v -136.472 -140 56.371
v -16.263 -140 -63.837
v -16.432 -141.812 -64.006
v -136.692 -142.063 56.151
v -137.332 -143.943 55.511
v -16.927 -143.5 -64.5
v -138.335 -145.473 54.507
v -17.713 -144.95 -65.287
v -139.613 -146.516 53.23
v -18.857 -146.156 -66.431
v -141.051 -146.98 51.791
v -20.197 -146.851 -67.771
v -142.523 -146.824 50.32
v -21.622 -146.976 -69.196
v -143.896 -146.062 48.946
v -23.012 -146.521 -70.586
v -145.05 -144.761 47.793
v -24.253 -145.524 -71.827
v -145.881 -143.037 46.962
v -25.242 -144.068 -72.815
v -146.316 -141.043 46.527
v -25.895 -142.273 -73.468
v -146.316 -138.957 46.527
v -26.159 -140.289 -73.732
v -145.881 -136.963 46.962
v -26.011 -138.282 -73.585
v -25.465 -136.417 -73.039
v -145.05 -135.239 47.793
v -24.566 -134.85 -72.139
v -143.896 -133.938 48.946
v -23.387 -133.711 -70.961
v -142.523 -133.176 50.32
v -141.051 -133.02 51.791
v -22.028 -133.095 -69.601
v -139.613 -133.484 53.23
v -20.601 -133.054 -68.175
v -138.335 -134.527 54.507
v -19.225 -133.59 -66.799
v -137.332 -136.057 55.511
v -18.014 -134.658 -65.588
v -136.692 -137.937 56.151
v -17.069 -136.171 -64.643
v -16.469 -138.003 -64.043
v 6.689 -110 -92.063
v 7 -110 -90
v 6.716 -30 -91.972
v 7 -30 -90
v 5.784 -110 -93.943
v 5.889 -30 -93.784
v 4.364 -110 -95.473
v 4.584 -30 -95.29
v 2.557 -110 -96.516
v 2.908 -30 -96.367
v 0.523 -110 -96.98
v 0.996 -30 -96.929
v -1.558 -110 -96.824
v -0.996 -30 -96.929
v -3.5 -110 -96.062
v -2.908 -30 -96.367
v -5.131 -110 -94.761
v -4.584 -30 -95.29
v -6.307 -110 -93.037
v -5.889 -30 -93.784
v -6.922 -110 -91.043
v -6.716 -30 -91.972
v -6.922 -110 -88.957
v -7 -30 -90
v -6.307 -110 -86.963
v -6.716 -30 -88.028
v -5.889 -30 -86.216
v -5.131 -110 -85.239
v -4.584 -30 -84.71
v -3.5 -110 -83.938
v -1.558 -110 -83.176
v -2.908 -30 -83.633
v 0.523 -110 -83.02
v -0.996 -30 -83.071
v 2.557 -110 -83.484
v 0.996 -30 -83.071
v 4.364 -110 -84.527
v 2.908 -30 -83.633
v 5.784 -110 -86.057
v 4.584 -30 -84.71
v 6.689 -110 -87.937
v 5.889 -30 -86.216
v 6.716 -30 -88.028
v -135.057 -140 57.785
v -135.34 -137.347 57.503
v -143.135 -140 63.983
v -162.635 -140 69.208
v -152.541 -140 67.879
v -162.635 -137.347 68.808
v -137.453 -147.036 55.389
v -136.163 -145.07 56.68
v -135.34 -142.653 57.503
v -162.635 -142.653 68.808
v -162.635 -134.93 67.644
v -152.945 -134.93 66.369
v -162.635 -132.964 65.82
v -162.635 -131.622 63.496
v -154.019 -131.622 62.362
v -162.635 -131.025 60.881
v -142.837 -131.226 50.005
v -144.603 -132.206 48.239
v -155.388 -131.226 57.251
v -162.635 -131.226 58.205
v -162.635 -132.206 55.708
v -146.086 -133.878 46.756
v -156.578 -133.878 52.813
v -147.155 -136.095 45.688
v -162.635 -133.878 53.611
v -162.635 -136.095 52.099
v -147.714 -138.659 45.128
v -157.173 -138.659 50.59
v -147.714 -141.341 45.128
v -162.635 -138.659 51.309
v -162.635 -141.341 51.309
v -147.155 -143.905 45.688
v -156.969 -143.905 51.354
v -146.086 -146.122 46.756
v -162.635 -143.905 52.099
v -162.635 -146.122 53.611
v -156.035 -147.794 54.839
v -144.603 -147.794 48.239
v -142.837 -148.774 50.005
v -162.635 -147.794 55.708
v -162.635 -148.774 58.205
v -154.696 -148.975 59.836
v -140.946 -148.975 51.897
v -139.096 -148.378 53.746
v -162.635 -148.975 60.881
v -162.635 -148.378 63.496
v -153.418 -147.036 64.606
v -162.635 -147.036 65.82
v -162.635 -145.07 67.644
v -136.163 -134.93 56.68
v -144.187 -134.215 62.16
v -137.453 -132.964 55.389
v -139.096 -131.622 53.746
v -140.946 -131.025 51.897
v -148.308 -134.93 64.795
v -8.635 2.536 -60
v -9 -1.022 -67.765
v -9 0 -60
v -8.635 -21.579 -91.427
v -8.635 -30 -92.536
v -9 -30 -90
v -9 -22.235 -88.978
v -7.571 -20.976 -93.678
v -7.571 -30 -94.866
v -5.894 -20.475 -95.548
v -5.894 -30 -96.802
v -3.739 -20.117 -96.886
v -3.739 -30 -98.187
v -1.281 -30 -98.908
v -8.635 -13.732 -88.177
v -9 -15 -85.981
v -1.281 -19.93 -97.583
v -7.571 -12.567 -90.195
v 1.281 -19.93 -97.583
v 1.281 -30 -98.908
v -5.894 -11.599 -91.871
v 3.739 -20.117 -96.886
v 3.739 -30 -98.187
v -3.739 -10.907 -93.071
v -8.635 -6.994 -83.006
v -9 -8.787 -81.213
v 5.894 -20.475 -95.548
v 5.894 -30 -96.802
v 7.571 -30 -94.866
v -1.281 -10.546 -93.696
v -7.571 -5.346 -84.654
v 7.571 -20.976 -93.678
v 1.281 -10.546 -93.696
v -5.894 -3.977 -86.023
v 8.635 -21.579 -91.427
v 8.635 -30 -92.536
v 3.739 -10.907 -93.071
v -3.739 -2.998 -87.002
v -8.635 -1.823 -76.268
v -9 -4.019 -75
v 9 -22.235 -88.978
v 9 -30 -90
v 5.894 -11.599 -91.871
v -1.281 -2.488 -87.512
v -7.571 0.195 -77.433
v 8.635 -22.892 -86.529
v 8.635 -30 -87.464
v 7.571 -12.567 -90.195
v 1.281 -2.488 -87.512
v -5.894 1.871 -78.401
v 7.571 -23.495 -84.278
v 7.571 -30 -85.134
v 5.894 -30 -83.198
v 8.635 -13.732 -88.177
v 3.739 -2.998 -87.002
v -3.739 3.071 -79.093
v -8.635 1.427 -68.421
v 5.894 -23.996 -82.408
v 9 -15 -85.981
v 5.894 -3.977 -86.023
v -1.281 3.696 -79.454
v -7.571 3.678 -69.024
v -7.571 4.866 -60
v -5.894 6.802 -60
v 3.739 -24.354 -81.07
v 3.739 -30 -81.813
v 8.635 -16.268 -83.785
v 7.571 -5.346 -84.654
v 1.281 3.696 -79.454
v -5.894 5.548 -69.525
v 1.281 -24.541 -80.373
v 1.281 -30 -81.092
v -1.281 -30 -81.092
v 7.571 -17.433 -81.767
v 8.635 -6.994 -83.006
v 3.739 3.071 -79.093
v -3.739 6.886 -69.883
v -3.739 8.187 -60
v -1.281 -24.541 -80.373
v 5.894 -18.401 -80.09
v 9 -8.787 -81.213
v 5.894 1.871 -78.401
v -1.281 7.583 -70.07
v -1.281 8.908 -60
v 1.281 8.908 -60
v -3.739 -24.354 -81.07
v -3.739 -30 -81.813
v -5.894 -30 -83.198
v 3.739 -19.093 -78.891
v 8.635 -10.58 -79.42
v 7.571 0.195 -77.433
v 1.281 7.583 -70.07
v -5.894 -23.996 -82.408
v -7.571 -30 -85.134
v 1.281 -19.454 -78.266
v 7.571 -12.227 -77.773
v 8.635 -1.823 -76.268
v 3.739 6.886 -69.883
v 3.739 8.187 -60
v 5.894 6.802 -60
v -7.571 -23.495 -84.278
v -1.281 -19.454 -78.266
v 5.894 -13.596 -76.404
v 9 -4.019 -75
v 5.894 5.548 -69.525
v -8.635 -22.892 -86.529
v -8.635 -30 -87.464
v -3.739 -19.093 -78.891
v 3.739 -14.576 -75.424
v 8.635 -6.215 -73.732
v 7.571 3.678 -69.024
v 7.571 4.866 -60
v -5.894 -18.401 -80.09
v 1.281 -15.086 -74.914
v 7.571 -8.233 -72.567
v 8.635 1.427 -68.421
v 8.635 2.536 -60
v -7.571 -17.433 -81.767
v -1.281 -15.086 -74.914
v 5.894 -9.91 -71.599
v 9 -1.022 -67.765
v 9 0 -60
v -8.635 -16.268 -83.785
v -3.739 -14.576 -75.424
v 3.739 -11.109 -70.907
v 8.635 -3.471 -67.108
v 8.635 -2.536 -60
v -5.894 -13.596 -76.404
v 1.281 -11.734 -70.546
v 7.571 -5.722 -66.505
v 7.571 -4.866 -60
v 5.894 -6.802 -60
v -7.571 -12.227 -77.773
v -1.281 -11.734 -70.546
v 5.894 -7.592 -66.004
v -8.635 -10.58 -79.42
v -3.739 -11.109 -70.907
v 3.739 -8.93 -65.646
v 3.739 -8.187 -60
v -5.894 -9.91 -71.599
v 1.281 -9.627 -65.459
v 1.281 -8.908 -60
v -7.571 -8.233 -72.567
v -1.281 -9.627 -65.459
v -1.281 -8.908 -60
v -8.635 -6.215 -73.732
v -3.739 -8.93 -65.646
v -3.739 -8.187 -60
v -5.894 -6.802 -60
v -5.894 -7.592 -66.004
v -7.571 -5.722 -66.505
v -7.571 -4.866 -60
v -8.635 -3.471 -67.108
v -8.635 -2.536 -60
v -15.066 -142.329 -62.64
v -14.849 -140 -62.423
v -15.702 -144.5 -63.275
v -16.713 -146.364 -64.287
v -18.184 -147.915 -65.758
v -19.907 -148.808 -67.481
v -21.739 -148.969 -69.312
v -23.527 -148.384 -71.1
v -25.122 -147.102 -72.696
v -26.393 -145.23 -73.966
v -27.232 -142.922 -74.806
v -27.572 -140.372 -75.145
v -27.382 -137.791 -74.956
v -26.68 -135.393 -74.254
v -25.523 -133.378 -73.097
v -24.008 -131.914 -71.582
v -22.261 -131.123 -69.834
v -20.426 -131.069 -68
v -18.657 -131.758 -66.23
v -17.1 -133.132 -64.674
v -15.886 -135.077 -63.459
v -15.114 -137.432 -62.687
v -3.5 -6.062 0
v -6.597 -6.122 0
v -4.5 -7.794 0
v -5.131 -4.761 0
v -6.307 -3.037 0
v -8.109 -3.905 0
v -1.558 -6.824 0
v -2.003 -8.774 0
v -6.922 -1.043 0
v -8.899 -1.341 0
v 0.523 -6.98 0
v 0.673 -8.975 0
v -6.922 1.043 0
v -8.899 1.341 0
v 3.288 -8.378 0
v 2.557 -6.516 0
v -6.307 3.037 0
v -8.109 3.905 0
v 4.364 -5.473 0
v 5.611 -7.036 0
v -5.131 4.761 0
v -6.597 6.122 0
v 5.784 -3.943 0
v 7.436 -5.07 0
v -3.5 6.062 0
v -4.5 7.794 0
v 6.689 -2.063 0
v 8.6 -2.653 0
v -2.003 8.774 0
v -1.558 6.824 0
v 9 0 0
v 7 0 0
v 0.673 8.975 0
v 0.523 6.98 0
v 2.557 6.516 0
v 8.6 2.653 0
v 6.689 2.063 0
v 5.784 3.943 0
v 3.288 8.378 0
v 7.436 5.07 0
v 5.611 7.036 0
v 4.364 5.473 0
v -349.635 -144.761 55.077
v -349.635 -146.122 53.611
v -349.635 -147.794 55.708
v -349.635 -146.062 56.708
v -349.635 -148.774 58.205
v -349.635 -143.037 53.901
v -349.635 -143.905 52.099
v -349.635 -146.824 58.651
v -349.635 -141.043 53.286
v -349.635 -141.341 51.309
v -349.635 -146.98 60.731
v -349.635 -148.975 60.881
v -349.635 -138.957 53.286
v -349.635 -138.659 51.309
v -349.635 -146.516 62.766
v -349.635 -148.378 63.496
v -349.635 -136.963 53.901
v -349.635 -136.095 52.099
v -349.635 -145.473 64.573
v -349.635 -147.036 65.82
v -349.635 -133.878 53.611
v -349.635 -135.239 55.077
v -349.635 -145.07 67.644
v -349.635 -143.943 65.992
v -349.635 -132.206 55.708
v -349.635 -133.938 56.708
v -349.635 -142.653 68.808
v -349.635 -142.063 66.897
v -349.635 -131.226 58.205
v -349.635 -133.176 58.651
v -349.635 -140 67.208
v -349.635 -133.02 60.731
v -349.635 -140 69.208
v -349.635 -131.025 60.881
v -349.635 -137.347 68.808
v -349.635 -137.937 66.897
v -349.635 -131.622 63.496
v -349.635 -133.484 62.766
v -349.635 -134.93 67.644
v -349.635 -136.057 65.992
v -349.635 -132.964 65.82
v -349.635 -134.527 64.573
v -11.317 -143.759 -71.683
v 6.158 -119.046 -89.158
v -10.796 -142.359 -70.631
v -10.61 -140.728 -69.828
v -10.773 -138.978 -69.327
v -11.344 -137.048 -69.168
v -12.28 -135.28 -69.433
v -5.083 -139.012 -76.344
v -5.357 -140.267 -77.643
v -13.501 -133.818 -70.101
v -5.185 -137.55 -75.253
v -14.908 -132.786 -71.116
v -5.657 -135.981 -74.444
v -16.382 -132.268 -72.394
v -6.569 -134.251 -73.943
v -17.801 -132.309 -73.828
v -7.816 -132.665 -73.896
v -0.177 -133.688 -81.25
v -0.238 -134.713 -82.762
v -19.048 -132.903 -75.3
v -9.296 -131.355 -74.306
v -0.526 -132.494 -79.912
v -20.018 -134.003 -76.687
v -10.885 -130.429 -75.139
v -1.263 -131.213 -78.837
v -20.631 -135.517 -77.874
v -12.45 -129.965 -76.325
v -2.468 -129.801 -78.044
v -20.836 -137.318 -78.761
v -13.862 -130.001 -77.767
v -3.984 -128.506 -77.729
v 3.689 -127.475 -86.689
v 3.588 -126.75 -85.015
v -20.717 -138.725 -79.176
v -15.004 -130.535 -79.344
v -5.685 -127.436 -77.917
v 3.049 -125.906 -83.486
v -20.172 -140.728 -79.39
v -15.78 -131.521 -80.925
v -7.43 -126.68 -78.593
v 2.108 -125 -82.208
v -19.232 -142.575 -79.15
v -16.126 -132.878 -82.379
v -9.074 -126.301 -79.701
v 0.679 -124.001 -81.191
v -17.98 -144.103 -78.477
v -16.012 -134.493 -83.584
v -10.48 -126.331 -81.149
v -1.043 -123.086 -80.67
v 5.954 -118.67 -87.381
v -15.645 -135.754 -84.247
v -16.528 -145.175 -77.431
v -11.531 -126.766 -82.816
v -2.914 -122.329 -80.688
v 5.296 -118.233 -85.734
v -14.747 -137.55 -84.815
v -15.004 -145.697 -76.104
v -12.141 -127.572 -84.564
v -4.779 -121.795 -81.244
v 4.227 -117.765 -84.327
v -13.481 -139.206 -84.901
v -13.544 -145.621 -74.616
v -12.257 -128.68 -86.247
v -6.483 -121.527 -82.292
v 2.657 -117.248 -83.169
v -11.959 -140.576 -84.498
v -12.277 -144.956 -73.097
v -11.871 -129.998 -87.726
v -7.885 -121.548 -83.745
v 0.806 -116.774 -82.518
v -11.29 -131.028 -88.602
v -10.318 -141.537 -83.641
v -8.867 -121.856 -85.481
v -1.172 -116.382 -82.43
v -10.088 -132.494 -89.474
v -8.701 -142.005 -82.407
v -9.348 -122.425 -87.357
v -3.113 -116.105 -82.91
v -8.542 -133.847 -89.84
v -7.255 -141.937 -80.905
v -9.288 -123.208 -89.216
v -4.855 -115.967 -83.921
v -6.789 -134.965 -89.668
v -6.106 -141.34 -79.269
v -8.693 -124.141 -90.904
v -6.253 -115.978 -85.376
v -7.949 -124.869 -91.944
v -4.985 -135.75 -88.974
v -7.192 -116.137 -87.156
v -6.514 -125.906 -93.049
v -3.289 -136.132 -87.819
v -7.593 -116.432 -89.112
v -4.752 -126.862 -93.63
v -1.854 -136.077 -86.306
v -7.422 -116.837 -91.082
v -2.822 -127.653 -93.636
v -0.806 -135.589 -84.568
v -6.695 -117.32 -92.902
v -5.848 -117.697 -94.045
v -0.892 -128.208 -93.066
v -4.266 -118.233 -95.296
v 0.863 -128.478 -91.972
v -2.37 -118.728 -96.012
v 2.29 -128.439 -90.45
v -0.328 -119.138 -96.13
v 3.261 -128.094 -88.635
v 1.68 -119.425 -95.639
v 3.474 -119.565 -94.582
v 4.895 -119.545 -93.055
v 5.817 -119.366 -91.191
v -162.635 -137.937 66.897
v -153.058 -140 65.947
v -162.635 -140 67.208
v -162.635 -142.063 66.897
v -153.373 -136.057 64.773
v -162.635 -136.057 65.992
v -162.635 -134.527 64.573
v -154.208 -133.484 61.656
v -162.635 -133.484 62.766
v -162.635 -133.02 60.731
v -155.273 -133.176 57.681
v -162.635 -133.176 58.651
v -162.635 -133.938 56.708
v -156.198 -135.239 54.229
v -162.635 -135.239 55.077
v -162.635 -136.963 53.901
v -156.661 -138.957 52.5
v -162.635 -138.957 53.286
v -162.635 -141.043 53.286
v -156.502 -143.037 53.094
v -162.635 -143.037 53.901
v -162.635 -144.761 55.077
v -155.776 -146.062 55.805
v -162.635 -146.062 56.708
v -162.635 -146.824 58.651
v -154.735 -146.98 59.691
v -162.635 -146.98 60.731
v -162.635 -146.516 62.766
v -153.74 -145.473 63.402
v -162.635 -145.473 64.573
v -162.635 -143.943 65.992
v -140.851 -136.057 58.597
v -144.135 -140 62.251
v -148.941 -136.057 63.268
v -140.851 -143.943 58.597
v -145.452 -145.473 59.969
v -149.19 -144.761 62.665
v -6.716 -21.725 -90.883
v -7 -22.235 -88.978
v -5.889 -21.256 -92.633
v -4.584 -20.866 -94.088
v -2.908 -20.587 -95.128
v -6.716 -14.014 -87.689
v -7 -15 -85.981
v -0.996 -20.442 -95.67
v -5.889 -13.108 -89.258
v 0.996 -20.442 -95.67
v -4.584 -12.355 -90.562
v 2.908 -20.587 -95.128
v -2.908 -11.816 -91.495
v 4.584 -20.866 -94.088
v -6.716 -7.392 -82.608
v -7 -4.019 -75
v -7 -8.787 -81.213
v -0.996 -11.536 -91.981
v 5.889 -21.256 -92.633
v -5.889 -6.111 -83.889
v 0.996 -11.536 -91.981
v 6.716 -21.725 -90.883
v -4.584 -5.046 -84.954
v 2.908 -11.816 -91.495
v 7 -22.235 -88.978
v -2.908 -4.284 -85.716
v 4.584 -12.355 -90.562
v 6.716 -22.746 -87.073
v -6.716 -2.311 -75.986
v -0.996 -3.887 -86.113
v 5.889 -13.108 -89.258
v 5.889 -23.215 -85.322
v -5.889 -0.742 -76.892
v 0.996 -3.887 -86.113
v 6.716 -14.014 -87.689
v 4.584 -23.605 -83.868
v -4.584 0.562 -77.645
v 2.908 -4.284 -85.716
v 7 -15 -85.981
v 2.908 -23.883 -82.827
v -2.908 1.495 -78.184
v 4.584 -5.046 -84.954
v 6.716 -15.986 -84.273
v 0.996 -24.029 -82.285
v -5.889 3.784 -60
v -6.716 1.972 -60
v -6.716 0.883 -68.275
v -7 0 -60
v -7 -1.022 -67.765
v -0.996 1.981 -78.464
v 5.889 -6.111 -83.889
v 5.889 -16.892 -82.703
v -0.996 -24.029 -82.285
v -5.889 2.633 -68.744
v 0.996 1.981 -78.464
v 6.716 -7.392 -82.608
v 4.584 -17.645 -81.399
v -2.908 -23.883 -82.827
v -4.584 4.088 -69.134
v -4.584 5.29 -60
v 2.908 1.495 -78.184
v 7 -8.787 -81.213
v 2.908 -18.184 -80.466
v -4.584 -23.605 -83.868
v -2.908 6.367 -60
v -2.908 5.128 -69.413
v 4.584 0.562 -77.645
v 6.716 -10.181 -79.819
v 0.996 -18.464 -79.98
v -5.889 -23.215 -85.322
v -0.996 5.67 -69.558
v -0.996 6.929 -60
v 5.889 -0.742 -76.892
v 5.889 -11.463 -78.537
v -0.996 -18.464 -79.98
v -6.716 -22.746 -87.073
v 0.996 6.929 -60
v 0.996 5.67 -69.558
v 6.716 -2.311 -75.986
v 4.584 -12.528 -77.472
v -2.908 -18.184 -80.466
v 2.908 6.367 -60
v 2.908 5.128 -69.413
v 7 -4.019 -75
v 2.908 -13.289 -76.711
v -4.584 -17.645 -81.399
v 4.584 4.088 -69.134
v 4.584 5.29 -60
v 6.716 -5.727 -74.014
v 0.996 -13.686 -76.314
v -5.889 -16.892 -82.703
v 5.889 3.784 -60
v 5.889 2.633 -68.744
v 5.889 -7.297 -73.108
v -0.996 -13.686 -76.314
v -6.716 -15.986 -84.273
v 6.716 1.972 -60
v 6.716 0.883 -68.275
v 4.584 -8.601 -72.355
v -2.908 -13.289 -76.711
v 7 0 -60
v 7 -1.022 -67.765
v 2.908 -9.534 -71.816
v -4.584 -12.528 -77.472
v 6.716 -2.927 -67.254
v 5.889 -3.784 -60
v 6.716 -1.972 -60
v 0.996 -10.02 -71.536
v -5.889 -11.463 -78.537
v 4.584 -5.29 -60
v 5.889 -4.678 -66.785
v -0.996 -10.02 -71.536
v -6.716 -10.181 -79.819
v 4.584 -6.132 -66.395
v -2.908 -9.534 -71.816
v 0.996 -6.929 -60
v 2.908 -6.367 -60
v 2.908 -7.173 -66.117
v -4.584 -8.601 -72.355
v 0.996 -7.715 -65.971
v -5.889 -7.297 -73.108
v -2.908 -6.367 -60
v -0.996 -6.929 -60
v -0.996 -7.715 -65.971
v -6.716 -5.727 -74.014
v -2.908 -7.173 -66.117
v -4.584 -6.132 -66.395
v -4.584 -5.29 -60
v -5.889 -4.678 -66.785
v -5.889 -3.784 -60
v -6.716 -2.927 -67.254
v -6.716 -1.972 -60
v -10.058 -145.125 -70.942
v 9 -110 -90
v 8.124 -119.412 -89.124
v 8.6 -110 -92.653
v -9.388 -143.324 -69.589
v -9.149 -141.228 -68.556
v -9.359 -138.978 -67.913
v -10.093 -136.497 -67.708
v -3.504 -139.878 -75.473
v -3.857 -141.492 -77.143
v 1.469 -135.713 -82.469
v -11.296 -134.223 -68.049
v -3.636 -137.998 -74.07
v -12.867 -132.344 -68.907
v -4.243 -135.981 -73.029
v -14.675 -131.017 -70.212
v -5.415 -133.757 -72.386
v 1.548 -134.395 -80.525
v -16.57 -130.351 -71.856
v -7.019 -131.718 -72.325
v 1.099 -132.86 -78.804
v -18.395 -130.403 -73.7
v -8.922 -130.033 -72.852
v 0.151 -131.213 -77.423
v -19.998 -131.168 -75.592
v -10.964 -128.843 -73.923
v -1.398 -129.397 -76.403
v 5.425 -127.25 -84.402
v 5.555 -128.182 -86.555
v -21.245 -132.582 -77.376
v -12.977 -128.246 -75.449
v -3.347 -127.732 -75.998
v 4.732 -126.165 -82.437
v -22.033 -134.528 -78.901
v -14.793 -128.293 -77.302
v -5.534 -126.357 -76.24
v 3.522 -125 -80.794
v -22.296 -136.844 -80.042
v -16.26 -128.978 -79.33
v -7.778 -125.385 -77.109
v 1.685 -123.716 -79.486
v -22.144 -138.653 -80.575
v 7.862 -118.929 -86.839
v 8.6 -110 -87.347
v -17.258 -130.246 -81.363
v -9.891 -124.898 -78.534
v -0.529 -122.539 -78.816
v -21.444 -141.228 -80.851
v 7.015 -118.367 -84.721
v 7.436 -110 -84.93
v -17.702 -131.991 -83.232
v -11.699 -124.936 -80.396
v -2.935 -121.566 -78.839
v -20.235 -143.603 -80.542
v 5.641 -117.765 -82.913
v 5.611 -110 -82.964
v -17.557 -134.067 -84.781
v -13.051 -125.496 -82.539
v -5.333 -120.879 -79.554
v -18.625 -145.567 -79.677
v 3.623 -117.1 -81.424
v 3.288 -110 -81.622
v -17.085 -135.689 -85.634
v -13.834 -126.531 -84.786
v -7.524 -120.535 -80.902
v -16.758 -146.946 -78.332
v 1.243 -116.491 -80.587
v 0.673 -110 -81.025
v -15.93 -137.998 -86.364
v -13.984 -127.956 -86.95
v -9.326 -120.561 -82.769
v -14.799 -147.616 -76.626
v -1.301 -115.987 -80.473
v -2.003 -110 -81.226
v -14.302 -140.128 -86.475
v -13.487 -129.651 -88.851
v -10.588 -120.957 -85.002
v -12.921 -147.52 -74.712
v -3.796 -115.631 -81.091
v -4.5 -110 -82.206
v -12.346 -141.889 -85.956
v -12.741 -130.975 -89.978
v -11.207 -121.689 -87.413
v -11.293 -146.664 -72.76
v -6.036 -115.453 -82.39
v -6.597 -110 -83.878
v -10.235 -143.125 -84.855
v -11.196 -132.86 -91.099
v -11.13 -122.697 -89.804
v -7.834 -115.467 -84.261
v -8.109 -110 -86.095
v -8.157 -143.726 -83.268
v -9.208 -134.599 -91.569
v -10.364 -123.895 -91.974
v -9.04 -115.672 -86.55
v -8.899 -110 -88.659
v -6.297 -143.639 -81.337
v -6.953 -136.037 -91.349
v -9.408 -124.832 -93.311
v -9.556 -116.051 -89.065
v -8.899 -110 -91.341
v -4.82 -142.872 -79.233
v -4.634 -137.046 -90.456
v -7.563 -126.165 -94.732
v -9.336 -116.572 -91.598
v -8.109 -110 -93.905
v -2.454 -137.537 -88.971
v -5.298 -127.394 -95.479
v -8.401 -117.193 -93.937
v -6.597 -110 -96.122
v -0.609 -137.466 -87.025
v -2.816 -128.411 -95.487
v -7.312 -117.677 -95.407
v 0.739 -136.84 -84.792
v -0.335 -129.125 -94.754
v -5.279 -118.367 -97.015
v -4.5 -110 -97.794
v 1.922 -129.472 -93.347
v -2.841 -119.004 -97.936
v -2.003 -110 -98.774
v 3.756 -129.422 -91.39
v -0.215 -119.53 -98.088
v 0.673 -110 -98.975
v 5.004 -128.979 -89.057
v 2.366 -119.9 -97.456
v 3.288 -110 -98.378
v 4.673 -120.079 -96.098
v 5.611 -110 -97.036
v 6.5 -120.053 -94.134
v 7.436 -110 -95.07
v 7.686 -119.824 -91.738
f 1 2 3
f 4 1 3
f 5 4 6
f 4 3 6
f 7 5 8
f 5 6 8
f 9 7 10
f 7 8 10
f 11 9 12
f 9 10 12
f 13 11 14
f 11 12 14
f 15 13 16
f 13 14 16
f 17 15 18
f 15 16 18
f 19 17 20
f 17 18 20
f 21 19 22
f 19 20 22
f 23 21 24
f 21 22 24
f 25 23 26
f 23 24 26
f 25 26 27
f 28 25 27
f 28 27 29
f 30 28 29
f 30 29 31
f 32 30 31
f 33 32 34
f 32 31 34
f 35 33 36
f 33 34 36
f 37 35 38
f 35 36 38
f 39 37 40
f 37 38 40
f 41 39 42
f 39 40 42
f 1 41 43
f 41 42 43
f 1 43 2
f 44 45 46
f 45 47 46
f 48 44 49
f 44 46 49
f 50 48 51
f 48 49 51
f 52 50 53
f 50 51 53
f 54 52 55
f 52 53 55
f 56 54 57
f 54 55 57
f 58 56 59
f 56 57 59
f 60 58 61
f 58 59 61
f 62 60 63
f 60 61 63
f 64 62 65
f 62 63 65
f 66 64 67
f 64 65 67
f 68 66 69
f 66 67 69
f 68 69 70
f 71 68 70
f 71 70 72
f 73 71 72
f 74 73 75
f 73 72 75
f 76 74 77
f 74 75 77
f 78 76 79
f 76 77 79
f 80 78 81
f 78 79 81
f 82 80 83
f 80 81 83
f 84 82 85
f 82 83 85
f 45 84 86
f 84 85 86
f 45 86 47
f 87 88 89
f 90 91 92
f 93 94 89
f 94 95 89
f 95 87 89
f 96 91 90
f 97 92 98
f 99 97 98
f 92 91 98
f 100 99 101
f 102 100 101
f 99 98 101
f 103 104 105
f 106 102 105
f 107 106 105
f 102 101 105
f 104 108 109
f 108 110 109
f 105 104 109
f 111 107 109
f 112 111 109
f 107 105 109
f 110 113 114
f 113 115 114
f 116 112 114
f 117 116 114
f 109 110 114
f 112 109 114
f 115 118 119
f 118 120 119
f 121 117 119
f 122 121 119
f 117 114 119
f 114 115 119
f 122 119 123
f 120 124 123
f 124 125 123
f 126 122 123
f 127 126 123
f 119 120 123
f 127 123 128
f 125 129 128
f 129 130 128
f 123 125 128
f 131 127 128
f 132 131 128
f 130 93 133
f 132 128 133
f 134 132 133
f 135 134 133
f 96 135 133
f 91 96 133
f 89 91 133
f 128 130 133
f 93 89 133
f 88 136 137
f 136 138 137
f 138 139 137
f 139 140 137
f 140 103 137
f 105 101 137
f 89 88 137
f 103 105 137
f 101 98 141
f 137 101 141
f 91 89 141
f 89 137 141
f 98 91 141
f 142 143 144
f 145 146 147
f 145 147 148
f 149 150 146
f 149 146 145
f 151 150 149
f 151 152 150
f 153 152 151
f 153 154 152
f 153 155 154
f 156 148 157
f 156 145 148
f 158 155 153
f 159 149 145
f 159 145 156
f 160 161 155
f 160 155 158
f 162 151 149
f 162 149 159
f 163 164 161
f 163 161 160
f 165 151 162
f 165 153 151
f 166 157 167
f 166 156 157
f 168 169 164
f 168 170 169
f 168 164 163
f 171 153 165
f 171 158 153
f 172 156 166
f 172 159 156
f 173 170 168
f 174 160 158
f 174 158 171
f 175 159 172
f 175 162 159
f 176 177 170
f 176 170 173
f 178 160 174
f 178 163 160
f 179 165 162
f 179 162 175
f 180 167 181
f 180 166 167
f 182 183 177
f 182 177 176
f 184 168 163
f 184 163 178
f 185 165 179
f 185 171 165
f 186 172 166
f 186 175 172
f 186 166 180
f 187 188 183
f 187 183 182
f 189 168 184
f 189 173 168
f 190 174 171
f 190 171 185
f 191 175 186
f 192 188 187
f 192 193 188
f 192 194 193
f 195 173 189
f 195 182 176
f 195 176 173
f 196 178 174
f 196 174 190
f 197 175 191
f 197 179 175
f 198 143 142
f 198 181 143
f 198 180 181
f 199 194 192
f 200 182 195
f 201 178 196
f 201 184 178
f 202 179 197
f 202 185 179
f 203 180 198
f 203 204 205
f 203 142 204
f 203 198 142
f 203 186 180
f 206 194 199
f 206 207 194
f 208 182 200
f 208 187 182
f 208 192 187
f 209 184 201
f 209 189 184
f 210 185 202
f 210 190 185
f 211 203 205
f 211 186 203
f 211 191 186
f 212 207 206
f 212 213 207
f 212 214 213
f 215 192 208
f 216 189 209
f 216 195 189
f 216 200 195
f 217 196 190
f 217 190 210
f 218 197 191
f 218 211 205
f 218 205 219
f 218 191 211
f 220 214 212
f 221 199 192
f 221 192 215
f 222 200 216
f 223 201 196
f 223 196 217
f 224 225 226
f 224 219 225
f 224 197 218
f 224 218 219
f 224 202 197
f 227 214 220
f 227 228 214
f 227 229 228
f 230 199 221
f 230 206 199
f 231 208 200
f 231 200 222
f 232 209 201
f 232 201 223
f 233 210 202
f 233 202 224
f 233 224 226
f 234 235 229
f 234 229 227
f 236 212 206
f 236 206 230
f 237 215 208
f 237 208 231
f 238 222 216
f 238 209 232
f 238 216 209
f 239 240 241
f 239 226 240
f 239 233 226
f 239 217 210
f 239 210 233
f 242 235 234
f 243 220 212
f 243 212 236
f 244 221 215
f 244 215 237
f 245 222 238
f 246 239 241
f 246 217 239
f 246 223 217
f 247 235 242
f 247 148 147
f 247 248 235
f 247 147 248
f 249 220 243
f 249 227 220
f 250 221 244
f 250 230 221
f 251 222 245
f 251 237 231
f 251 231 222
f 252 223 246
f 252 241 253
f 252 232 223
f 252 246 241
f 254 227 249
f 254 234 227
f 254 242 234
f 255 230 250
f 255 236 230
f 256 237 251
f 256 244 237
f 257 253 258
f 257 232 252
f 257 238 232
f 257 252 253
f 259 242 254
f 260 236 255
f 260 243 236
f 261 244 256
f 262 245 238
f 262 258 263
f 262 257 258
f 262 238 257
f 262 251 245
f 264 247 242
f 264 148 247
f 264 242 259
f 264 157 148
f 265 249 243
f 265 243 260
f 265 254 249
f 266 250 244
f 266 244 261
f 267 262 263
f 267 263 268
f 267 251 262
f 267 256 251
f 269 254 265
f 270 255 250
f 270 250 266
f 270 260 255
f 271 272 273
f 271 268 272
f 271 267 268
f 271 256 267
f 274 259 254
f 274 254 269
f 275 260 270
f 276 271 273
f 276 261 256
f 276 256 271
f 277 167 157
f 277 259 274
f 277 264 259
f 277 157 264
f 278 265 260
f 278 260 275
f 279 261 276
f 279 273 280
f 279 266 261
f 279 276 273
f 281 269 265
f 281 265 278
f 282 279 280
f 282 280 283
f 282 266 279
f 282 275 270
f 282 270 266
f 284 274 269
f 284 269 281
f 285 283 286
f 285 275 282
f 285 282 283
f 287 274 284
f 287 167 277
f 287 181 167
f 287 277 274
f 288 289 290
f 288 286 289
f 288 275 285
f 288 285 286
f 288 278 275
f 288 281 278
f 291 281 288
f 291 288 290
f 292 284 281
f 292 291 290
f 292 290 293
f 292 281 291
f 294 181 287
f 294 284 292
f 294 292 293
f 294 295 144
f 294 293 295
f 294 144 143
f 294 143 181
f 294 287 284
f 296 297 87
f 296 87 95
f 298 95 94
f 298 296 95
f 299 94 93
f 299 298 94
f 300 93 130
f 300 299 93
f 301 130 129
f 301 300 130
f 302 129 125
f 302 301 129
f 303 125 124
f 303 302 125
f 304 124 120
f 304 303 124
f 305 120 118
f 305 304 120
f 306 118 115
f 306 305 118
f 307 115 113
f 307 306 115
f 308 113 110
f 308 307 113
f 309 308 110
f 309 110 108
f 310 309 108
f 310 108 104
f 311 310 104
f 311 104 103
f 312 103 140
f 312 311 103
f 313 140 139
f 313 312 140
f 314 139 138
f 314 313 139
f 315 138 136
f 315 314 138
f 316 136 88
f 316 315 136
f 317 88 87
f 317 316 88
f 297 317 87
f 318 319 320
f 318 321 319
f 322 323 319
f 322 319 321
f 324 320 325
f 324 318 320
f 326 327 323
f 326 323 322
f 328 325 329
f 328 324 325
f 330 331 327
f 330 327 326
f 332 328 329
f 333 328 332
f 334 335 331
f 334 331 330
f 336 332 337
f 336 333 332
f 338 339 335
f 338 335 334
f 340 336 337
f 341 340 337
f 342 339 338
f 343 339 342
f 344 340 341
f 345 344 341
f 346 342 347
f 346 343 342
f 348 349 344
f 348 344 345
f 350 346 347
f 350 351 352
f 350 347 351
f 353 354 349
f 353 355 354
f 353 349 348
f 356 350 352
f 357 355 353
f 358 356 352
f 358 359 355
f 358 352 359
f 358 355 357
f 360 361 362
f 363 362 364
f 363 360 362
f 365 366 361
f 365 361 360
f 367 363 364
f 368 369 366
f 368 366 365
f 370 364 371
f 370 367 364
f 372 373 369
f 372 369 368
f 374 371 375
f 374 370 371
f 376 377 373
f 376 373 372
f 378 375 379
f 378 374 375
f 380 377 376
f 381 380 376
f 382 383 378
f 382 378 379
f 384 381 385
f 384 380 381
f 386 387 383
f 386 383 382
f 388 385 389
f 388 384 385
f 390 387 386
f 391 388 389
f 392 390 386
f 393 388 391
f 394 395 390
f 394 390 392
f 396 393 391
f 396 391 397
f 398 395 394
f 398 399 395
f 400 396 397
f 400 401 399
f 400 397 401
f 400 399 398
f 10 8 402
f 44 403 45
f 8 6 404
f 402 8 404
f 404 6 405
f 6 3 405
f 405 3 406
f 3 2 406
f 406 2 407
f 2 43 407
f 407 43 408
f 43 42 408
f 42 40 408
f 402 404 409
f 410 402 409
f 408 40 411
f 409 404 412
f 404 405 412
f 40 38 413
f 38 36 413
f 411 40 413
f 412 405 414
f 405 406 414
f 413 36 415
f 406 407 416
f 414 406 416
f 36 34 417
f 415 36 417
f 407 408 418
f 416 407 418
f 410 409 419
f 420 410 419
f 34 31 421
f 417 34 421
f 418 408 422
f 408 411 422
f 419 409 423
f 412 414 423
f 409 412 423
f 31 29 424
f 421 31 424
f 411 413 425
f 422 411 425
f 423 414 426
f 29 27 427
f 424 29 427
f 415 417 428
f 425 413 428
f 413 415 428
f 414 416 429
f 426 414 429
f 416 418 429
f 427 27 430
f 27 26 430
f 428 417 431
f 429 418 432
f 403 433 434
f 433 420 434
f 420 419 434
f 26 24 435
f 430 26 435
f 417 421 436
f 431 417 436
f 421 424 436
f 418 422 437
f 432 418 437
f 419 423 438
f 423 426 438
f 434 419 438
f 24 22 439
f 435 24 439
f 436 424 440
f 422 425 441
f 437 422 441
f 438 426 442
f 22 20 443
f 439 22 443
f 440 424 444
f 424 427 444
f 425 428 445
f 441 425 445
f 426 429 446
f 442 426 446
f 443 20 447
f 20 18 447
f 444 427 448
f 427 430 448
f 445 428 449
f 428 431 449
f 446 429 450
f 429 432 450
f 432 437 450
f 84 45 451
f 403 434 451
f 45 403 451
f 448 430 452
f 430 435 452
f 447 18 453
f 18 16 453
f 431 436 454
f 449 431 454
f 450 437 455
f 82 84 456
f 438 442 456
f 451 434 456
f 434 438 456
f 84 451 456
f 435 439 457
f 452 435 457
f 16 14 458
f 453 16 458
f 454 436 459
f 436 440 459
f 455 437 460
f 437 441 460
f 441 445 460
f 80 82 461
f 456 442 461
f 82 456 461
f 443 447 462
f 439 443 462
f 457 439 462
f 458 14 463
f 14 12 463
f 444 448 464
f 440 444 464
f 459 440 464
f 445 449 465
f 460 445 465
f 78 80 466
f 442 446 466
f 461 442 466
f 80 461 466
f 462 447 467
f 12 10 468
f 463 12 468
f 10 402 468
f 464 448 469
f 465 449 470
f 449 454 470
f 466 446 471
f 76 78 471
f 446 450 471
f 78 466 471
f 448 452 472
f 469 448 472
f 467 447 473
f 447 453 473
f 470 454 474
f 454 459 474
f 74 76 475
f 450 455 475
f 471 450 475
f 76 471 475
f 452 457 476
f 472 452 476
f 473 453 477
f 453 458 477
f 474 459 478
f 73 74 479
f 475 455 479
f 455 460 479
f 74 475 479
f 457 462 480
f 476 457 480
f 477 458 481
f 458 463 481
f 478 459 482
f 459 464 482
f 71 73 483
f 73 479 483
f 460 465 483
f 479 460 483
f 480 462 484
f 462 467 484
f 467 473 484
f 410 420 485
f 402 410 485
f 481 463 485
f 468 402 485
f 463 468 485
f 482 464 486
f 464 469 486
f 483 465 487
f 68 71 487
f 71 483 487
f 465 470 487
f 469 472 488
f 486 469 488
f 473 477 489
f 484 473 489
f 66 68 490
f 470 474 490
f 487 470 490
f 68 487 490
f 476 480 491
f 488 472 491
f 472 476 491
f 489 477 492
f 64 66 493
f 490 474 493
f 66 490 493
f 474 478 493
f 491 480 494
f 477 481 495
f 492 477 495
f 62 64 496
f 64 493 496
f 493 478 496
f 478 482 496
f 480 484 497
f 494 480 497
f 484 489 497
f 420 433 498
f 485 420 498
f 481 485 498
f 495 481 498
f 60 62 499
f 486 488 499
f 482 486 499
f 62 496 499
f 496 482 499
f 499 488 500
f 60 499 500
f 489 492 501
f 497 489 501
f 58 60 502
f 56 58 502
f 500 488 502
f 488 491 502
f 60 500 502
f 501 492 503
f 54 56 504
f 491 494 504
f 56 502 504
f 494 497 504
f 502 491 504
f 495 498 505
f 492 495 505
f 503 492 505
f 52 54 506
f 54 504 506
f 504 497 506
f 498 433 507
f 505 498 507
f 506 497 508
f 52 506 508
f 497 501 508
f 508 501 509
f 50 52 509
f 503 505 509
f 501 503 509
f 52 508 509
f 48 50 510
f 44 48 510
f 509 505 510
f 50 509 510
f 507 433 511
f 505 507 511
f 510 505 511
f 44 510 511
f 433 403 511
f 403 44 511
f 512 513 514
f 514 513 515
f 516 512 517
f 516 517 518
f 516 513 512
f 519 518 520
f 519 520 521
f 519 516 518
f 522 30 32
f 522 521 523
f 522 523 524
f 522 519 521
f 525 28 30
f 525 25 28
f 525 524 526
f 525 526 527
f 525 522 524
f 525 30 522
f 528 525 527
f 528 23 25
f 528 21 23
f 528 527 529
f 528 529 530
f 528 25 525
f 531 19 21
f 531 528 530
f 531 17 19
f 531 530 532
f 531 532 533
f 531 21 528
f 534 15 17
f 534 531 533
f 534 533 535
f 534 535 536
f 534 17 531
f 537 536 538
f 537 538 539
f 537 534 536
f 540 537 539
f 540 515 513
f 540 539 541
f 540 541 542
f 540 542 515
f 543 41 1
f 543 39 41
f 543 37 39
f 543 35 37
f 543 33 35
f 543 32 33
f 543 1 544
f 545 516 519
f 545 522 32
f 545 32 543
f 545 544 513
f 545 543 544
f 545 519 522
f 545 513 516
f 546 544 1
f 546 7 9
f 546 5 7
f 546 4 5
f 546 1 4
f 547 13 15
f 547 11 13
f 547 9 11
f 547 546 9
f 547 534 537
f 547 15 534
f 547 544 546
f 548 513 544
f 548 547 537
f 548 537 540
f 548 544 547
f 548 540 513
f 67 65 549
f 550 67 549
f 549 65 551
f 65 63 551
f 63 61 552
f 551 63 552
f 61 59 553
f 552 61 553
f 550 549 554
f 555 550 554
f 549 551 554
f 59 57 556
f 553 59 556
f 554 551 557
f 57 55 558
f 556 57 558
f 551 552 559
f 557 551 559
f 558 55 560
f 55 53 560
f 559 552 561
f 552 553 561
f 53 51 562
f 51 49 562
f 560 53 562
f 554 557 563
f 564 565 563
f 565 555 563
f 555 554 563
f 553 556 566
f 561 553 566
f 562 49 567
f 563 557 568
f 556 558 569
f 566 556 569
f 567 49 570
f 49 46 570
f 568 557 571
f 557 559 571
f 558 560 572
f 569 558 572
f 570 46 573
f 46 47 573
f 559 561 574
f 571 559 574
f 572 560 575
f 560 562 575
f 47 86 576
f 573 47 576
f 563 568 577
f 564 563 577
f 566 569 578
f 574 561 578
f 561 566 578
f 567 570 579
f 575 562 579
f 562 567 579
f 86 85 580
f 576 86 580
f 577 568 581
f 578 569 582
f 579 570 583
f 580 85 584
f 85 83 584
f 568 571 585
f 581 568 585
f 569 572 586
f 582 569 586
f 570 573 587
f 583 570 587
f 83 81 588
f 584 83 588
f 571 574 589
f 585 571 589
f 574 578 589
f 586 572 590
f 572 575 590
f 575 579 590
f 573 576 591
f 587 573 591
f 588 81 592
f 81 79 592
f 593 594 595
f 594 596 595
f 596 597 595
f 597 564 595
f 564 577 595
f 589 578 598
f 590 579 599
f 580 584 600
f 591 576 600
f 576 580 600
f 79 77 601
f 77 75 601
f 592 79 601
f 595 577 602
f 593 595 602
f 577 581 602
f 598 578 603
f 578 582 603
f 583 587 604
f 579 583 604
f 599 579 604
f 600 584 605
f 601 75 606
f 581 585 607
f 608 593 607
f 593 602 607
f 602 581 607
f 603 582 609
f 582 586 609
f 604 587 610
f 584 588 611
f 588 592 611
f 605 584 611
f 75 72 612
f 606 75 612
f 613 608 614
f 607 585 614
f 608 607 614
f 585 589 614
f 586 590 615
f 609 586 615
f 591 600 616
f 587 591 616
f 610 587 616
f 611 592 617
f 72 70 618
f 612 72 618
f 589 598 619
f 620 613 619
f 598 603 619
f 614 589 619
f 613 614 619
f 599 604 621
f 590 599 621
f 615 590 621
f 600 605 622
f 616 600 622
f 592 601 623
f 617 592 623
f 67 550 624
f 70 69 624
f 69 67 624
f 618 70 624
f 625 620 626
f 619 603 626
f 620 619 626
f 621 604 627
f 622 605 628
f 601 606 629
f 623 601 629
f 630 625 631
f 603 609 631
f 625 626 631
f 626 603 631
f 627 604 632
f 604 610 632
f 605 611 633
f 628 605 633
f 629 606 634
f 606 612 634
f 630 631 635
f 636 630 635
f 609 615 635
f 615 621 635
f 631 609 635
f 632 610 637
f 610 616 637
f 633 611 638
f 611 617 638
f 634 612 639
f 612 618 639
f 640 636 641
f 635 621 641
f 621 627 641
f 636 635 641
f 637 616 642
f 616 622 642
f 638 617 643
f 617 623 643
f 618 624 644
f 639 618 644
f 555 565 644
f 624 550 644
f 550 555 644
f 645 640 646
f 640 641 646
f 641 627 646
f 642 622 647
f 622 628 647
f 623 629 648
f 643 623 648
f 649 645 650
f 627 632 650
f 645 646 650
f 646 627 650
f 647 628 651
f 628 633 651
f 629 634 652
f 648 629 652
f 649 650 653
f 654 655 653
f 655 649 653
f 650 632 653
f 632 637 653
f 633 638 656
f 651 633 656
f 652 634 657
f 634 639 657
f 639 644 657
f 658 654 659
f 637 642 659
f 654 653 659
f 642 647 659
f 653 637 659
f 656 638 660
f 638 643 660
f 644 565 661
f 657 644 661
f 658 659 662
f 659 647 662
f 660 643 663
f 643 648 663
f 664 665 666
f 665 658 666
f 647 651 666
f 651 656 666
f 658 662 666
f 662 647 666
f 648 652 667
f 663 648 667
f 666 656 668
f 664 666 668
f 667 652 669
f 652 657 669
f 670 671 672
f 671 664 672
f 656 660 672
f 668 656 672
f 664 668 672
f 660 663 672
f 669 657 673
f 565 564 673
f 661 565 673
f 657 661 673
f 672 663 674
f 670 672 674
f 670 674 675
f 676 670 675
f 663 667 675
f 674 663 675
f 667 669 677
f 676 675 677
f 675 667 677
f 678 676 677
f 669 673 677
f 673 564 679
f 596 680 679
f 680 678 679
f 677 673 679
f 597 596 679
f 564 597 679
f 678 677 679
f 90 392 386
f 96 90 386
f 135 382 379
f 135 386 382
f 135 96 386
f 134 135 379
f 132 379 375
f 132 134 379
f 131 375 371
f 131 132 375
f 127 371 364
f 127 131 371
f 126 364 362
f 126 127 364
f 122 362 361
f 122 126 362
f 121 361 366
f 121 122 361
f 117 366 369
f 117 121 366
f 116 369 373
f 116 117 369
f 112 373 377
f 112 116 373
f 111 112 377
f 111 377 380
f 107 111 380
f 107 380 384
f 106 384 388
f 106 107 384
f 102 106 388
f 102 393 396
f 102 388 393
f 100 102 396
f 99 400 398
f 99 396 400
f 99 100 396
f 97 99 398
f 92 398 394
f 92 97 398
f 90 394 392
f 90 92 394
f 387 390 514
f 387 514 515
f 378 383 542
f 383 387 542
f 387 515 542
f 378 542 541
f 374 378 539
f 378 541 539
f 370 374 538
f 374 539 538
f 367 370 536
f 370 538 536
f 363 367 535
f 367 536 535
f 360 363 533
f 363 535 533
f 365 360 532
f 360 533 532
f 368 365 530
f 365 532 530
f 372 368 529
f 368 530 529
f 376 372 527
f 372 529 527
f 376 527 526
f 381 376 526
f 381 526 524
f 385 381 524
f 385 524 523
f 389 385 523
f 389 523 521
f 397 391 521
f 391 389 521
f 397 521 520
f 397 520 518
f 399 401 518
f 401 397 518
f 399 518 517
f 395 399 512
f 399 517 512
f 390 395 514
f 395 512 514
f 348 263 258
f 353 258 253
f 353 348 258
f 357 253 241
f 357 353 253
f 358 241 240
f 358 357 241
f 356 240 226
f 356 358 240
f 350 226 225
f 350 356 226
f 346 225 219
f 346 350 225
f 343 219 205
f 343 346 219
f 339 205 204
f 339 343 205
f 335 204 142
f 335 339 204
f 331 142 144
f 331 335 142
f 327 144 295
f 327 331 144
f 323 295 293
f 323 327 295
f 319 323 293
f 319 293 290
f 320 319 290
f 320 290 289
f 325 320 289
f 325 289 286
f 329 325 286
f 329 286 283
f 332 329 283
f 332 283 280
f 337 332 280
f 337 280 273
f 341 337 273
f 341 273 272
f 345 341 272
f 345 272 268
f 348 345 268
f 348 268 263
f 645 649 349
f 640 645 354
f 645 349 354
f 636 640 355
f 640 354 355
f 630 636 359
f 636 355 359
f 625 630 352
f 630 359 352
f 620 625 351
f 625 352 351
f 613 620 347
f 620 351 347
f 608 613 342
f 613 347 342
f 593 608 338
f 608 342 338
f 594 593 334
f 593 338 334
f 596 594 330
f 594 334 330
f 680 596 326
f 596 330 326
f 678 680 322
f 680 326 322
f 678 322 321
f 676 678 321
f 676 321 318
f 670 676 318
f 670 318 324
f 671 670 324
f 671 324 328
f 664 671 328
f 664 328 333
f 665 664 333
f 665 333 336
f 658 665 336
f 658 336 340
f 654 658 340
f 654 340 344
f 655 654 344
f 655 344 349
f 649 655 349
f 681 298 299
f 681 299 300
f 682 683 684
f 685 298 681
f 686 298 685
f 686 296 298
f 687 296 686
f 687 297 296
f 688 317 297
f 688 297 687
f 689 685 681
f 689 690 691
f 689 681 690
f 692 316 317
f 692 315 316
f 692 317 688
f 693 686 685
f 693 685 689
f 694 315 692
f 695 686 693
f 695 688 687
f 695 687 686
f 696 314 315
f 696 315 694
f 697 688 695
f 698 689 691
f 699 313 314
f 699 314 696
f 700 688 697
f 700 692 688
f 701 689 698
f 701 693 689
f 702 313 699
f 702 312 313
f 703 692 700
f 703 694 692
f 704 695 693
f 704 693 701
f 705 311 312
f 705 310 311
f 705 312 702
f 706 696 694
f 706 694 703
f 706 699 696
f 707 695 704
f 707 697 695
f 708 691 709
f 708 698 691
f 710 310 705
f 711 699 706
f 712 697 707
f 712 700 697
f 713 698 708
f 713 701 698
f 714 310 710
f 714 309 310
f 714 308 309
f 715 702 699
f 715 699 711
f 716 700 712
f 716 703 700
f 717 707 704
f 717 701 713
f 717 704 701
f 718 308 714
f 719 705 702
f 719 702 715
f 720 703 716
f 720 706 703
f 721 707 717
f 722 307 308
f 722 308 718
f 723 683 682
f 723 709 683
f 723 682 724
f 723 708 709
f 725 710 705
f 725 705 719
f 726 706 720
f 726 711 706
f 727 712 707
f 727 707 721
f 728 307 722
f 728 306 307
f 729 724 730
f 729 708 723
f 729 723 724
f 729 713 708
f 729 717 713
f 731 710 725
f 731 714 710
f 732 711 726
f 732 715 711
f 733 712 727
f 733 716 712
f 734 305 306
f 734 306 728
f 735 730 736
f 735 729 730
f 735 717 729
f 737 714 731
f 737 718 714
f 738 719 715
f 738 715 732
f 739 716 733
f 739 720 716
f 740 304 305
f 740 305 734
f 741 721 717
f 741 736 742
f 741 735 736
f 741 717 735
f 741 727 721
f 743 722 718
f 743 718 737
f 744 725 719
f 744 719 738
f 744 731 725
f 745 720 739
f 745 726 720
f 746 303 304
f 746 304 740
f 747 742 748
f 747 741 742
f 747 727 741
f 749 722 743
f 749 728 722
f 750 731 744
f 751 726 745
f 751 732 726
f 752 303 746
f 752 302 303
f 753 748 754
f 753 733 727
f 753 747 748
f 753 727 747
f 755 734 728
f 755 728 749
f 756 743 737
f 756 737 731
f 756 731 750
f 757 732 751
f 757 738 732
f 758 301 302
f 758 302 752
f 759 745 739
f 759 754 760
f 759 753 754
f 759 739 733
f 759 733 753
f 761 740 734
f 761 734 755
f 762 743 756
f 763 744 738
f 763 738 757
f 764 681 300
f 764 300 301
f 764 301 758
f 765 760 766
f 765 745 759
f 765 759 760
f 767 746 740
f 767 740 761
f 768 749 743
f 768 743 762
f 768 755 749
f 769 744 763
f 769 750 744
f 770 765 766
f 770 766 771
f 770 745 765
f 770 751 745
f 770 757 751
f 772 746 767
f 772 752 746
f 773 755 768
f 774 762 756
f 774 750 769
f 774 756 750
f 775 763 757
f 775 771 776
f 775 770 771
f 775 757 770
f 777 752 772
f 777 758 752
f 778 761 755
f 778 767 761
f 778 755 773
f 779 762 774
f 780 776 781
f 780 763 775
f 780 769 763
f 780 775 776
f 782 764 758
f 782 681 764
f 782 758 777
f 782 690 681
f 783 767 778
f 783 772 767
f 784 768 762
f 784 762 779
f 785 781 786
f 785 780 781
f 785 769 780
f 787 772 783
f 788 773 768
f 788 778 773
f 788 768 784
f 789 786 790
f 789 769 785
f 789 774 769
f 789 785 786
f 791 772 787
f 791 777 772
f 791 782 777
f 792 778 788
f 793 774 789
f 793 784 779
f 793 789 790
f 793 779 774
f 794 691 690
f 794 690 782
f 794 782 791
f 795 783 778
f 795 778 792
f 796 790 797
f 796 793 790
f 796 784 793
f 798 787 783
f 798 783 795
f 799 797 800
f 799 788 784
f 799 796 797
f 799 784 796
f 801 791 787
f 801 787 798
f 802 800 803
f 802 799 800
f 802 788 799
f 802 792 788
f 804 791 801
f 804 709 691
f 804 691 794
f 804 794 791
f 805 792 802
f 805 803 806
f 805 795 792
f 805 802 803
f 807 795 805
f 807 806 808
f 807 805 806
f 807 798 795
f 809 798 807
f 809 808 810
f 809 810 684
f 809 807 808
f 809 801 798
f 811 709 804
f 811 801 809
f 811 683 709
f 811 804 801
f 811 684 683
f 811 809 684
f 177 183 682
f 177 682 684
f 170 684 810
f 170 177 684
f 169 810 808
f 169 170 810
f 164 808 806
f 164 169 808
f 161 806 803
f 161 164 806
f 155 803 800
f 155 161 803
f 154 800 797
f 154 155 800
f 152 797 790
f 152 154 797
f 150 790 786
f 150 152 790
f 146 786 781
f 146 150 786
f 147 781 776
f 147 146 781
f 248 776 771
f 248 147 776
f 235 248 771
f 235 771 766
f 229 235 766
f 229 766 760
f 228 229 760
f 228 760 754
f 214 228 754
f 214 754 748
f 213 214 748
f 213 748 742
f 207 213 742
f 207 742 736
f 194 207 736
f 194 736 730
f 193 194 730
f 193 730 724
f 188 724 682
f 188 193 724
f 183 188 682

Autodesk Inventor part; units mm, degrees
ref_plane "YZ Plane" through (0, 0, 0) normal (1, 0, 0) x (0, 1, 0)
ref_plane "XZ Plane" through (0, 0, 0) normal (0, 1, 0) x (-1, 0, 0)
ref_plane "XY Plane" through (0, 0, 0) normal (0, 0, 1) x (1, 0, 0)
sketch "Esboço1" plane through (0, 0, 0) normal (0, 0, 1) x (1, 0, 0)
  circle A0 centre (0, 0) radius 7
  circle A1 centre (0, 0) radius 9
  dimension "d0" = 14
  dimension "d1" = 18
sketch "Esboço1 outline for Extrusão1" plane through (0, 0, 0) normal (0, 0, 1) x (1, 0, 0)
  circle A0 centre (0, 0) radius 9
  circle A1 centre (0, 0) radius 7
extrude "Extrusão1" add sketch "Esboço1 outline for Extrusão1" against normal blind 60
sketch "Esboço8" plane through (0, 0, -60) normal (0, 0, -1) x (-1, 0, 0)
  circle A0 centre (0, 0) radius 9 projected
  circle A1 centre (0, 0) radius 7 projected
  line L0 (0, 0) -> (0, -30)
  line L1 (-15, -30) -> (15, -30)
  dimension "d18" = 30
  dimension "d19" = 30
sketch "Esboço8 outline for Revolução4" plane through (0, 0, -60) normal (0, 0, -1) x (-1, 0, 0)
  circle A0 centre (0, 0) radius 9
  circle A1 centre (0, 0) radius 7
revolve "Revolução4" add sketch "Esboço8 outline for Revolução4" angle 90 about axis through (15, -30, -60) along (-1, 0, 0)
sketch "Esboço9" plane through (0, -30, -90) normal (0, -1, 0) x (1, 0, 0)
  circle A0 centre (0, 0) radius 9 projected
  circle A1 centre (0, 0) radius 7 projected
  point P0 (0, 90)
sketch "Esboço9 outline for Extrusão3" plane through (0, -30, -90) normal (0, -1, 0) x (1, 0, 0)
  circle A0 centre (0, 0) radius 9
  circle A1 centre (0, 0) radius 7
extrude "Extrusão3" add sketch "Esboço9 outline for Extrusão3" along normal blind 80
sketch "Esboço10" plane through (0, -110, -90) normal (0, -1, 0) x (1, 0, 0)
  circle A0 centre (0, 0) radius 9
  circle A1 centre (0, 0) radius 7
  line L0 (0, 0) -> (-21.213203, 21.213203)
  line L1 (0, 0) -> (0, 30)
  line L2 (-10.606602, 31.819805) -> (-31.819805, 10.606602)
  point P0 (0, 90)
  dimension "d23" = 30
  dimension "d24" = 45
  dimension "d25" = 30
  dimension "d26" = 30
sketch "Esboço10 outline for Revolução5" plane through (0, -110, -90) normal (0, -1, 0) x (1, 0, 0)
  circle A0 centre (0, 0) radius 9
  circle A1 centre (0, 0) radius 7
revolve "Revolução5" add sketch "Esboço10 outline for Revolução5" angle 90 about axis through (-10.606602, -110, -58.180195) along (-0.7071068, 0, -0.7071068)
sketch "Esboço11" plane through (-21.213203, -140, -68.786797) normal (-0.7071068, 0, 0.7071068) x (0.7071068, 0, 0.7071068)
  circle A0 centre (0, 0) radius 9 projected
  circle A1 centre (0, 0) radius 7 projected
  point P0 (63.63961, 140)
sketch "Esboço11 outline for Extrusão4" plane through (-21.213203, -140, -68.786797) normal (-0.7071068, 0, 0.7071068) x (0.7071068, 0, 0.7071068)
  circle A0 centre (0, 0) radius 9
  circle A1 centre (0, 0) radius 7
extrude "Extrusão4" add sketch "Esboço11 outline for Extrusão4" along normal blind 170
sketch "Esboço12" plane through (-141.421356, -140, 51.421356) normal (-0.7071068, 0, 0.7071068) x (0.7071068, 0, 0.7071068)
  circle A0 centre (0, 0) radius 9 projected
  circle A1 centre (0, 0) radius 7 projected
  line L0 (0, 0) -> (-30, 0)
  line L1 (-30, 15) -> (-30, -15)
  point P0 (63.63961, 140)
  dimension "d30" = 30
  dimension "d31" = 30
sketch "Esboço12 outline for Revolução6" plane through (-141.421356, -140, 51.421356) normal (-0.7071068, 0, 0.7071068) x (0.7071068, 0, 0.7071068)
  circle A0 centre (0, 0) radius 9
  circle A1 centre (0, 0) radius 7
revolve "Revolução6" add sketch "Esboço12 outline for Revolução6" angle 45 about axis through (-162.63456, -125, 30.208153) along (0, -1, 0)
sketch "Esboço13" plane through (-162.63456, -140, 60.208153) normal (-1, 0, 0) x (0, 0, 1)
  circle A0 centre (0, 0) radius 9 projected
  circle A1 centre (0, 0) radius 7 projected
  point P0 (-60.208153, 140)
sketch "Esboço13 outline for Extrusão5" plane through (-162.63456, -140, 60.208153) normal (-1, 0, 0) x (0, 0, 1)
  circle A0 centre (0, 0) radius 9
  circle A1 centre (0, 0) radius 7
extrude "Extrusão5" add sketch "Esboço13 outline for Extrusão5" along normal blind 187
